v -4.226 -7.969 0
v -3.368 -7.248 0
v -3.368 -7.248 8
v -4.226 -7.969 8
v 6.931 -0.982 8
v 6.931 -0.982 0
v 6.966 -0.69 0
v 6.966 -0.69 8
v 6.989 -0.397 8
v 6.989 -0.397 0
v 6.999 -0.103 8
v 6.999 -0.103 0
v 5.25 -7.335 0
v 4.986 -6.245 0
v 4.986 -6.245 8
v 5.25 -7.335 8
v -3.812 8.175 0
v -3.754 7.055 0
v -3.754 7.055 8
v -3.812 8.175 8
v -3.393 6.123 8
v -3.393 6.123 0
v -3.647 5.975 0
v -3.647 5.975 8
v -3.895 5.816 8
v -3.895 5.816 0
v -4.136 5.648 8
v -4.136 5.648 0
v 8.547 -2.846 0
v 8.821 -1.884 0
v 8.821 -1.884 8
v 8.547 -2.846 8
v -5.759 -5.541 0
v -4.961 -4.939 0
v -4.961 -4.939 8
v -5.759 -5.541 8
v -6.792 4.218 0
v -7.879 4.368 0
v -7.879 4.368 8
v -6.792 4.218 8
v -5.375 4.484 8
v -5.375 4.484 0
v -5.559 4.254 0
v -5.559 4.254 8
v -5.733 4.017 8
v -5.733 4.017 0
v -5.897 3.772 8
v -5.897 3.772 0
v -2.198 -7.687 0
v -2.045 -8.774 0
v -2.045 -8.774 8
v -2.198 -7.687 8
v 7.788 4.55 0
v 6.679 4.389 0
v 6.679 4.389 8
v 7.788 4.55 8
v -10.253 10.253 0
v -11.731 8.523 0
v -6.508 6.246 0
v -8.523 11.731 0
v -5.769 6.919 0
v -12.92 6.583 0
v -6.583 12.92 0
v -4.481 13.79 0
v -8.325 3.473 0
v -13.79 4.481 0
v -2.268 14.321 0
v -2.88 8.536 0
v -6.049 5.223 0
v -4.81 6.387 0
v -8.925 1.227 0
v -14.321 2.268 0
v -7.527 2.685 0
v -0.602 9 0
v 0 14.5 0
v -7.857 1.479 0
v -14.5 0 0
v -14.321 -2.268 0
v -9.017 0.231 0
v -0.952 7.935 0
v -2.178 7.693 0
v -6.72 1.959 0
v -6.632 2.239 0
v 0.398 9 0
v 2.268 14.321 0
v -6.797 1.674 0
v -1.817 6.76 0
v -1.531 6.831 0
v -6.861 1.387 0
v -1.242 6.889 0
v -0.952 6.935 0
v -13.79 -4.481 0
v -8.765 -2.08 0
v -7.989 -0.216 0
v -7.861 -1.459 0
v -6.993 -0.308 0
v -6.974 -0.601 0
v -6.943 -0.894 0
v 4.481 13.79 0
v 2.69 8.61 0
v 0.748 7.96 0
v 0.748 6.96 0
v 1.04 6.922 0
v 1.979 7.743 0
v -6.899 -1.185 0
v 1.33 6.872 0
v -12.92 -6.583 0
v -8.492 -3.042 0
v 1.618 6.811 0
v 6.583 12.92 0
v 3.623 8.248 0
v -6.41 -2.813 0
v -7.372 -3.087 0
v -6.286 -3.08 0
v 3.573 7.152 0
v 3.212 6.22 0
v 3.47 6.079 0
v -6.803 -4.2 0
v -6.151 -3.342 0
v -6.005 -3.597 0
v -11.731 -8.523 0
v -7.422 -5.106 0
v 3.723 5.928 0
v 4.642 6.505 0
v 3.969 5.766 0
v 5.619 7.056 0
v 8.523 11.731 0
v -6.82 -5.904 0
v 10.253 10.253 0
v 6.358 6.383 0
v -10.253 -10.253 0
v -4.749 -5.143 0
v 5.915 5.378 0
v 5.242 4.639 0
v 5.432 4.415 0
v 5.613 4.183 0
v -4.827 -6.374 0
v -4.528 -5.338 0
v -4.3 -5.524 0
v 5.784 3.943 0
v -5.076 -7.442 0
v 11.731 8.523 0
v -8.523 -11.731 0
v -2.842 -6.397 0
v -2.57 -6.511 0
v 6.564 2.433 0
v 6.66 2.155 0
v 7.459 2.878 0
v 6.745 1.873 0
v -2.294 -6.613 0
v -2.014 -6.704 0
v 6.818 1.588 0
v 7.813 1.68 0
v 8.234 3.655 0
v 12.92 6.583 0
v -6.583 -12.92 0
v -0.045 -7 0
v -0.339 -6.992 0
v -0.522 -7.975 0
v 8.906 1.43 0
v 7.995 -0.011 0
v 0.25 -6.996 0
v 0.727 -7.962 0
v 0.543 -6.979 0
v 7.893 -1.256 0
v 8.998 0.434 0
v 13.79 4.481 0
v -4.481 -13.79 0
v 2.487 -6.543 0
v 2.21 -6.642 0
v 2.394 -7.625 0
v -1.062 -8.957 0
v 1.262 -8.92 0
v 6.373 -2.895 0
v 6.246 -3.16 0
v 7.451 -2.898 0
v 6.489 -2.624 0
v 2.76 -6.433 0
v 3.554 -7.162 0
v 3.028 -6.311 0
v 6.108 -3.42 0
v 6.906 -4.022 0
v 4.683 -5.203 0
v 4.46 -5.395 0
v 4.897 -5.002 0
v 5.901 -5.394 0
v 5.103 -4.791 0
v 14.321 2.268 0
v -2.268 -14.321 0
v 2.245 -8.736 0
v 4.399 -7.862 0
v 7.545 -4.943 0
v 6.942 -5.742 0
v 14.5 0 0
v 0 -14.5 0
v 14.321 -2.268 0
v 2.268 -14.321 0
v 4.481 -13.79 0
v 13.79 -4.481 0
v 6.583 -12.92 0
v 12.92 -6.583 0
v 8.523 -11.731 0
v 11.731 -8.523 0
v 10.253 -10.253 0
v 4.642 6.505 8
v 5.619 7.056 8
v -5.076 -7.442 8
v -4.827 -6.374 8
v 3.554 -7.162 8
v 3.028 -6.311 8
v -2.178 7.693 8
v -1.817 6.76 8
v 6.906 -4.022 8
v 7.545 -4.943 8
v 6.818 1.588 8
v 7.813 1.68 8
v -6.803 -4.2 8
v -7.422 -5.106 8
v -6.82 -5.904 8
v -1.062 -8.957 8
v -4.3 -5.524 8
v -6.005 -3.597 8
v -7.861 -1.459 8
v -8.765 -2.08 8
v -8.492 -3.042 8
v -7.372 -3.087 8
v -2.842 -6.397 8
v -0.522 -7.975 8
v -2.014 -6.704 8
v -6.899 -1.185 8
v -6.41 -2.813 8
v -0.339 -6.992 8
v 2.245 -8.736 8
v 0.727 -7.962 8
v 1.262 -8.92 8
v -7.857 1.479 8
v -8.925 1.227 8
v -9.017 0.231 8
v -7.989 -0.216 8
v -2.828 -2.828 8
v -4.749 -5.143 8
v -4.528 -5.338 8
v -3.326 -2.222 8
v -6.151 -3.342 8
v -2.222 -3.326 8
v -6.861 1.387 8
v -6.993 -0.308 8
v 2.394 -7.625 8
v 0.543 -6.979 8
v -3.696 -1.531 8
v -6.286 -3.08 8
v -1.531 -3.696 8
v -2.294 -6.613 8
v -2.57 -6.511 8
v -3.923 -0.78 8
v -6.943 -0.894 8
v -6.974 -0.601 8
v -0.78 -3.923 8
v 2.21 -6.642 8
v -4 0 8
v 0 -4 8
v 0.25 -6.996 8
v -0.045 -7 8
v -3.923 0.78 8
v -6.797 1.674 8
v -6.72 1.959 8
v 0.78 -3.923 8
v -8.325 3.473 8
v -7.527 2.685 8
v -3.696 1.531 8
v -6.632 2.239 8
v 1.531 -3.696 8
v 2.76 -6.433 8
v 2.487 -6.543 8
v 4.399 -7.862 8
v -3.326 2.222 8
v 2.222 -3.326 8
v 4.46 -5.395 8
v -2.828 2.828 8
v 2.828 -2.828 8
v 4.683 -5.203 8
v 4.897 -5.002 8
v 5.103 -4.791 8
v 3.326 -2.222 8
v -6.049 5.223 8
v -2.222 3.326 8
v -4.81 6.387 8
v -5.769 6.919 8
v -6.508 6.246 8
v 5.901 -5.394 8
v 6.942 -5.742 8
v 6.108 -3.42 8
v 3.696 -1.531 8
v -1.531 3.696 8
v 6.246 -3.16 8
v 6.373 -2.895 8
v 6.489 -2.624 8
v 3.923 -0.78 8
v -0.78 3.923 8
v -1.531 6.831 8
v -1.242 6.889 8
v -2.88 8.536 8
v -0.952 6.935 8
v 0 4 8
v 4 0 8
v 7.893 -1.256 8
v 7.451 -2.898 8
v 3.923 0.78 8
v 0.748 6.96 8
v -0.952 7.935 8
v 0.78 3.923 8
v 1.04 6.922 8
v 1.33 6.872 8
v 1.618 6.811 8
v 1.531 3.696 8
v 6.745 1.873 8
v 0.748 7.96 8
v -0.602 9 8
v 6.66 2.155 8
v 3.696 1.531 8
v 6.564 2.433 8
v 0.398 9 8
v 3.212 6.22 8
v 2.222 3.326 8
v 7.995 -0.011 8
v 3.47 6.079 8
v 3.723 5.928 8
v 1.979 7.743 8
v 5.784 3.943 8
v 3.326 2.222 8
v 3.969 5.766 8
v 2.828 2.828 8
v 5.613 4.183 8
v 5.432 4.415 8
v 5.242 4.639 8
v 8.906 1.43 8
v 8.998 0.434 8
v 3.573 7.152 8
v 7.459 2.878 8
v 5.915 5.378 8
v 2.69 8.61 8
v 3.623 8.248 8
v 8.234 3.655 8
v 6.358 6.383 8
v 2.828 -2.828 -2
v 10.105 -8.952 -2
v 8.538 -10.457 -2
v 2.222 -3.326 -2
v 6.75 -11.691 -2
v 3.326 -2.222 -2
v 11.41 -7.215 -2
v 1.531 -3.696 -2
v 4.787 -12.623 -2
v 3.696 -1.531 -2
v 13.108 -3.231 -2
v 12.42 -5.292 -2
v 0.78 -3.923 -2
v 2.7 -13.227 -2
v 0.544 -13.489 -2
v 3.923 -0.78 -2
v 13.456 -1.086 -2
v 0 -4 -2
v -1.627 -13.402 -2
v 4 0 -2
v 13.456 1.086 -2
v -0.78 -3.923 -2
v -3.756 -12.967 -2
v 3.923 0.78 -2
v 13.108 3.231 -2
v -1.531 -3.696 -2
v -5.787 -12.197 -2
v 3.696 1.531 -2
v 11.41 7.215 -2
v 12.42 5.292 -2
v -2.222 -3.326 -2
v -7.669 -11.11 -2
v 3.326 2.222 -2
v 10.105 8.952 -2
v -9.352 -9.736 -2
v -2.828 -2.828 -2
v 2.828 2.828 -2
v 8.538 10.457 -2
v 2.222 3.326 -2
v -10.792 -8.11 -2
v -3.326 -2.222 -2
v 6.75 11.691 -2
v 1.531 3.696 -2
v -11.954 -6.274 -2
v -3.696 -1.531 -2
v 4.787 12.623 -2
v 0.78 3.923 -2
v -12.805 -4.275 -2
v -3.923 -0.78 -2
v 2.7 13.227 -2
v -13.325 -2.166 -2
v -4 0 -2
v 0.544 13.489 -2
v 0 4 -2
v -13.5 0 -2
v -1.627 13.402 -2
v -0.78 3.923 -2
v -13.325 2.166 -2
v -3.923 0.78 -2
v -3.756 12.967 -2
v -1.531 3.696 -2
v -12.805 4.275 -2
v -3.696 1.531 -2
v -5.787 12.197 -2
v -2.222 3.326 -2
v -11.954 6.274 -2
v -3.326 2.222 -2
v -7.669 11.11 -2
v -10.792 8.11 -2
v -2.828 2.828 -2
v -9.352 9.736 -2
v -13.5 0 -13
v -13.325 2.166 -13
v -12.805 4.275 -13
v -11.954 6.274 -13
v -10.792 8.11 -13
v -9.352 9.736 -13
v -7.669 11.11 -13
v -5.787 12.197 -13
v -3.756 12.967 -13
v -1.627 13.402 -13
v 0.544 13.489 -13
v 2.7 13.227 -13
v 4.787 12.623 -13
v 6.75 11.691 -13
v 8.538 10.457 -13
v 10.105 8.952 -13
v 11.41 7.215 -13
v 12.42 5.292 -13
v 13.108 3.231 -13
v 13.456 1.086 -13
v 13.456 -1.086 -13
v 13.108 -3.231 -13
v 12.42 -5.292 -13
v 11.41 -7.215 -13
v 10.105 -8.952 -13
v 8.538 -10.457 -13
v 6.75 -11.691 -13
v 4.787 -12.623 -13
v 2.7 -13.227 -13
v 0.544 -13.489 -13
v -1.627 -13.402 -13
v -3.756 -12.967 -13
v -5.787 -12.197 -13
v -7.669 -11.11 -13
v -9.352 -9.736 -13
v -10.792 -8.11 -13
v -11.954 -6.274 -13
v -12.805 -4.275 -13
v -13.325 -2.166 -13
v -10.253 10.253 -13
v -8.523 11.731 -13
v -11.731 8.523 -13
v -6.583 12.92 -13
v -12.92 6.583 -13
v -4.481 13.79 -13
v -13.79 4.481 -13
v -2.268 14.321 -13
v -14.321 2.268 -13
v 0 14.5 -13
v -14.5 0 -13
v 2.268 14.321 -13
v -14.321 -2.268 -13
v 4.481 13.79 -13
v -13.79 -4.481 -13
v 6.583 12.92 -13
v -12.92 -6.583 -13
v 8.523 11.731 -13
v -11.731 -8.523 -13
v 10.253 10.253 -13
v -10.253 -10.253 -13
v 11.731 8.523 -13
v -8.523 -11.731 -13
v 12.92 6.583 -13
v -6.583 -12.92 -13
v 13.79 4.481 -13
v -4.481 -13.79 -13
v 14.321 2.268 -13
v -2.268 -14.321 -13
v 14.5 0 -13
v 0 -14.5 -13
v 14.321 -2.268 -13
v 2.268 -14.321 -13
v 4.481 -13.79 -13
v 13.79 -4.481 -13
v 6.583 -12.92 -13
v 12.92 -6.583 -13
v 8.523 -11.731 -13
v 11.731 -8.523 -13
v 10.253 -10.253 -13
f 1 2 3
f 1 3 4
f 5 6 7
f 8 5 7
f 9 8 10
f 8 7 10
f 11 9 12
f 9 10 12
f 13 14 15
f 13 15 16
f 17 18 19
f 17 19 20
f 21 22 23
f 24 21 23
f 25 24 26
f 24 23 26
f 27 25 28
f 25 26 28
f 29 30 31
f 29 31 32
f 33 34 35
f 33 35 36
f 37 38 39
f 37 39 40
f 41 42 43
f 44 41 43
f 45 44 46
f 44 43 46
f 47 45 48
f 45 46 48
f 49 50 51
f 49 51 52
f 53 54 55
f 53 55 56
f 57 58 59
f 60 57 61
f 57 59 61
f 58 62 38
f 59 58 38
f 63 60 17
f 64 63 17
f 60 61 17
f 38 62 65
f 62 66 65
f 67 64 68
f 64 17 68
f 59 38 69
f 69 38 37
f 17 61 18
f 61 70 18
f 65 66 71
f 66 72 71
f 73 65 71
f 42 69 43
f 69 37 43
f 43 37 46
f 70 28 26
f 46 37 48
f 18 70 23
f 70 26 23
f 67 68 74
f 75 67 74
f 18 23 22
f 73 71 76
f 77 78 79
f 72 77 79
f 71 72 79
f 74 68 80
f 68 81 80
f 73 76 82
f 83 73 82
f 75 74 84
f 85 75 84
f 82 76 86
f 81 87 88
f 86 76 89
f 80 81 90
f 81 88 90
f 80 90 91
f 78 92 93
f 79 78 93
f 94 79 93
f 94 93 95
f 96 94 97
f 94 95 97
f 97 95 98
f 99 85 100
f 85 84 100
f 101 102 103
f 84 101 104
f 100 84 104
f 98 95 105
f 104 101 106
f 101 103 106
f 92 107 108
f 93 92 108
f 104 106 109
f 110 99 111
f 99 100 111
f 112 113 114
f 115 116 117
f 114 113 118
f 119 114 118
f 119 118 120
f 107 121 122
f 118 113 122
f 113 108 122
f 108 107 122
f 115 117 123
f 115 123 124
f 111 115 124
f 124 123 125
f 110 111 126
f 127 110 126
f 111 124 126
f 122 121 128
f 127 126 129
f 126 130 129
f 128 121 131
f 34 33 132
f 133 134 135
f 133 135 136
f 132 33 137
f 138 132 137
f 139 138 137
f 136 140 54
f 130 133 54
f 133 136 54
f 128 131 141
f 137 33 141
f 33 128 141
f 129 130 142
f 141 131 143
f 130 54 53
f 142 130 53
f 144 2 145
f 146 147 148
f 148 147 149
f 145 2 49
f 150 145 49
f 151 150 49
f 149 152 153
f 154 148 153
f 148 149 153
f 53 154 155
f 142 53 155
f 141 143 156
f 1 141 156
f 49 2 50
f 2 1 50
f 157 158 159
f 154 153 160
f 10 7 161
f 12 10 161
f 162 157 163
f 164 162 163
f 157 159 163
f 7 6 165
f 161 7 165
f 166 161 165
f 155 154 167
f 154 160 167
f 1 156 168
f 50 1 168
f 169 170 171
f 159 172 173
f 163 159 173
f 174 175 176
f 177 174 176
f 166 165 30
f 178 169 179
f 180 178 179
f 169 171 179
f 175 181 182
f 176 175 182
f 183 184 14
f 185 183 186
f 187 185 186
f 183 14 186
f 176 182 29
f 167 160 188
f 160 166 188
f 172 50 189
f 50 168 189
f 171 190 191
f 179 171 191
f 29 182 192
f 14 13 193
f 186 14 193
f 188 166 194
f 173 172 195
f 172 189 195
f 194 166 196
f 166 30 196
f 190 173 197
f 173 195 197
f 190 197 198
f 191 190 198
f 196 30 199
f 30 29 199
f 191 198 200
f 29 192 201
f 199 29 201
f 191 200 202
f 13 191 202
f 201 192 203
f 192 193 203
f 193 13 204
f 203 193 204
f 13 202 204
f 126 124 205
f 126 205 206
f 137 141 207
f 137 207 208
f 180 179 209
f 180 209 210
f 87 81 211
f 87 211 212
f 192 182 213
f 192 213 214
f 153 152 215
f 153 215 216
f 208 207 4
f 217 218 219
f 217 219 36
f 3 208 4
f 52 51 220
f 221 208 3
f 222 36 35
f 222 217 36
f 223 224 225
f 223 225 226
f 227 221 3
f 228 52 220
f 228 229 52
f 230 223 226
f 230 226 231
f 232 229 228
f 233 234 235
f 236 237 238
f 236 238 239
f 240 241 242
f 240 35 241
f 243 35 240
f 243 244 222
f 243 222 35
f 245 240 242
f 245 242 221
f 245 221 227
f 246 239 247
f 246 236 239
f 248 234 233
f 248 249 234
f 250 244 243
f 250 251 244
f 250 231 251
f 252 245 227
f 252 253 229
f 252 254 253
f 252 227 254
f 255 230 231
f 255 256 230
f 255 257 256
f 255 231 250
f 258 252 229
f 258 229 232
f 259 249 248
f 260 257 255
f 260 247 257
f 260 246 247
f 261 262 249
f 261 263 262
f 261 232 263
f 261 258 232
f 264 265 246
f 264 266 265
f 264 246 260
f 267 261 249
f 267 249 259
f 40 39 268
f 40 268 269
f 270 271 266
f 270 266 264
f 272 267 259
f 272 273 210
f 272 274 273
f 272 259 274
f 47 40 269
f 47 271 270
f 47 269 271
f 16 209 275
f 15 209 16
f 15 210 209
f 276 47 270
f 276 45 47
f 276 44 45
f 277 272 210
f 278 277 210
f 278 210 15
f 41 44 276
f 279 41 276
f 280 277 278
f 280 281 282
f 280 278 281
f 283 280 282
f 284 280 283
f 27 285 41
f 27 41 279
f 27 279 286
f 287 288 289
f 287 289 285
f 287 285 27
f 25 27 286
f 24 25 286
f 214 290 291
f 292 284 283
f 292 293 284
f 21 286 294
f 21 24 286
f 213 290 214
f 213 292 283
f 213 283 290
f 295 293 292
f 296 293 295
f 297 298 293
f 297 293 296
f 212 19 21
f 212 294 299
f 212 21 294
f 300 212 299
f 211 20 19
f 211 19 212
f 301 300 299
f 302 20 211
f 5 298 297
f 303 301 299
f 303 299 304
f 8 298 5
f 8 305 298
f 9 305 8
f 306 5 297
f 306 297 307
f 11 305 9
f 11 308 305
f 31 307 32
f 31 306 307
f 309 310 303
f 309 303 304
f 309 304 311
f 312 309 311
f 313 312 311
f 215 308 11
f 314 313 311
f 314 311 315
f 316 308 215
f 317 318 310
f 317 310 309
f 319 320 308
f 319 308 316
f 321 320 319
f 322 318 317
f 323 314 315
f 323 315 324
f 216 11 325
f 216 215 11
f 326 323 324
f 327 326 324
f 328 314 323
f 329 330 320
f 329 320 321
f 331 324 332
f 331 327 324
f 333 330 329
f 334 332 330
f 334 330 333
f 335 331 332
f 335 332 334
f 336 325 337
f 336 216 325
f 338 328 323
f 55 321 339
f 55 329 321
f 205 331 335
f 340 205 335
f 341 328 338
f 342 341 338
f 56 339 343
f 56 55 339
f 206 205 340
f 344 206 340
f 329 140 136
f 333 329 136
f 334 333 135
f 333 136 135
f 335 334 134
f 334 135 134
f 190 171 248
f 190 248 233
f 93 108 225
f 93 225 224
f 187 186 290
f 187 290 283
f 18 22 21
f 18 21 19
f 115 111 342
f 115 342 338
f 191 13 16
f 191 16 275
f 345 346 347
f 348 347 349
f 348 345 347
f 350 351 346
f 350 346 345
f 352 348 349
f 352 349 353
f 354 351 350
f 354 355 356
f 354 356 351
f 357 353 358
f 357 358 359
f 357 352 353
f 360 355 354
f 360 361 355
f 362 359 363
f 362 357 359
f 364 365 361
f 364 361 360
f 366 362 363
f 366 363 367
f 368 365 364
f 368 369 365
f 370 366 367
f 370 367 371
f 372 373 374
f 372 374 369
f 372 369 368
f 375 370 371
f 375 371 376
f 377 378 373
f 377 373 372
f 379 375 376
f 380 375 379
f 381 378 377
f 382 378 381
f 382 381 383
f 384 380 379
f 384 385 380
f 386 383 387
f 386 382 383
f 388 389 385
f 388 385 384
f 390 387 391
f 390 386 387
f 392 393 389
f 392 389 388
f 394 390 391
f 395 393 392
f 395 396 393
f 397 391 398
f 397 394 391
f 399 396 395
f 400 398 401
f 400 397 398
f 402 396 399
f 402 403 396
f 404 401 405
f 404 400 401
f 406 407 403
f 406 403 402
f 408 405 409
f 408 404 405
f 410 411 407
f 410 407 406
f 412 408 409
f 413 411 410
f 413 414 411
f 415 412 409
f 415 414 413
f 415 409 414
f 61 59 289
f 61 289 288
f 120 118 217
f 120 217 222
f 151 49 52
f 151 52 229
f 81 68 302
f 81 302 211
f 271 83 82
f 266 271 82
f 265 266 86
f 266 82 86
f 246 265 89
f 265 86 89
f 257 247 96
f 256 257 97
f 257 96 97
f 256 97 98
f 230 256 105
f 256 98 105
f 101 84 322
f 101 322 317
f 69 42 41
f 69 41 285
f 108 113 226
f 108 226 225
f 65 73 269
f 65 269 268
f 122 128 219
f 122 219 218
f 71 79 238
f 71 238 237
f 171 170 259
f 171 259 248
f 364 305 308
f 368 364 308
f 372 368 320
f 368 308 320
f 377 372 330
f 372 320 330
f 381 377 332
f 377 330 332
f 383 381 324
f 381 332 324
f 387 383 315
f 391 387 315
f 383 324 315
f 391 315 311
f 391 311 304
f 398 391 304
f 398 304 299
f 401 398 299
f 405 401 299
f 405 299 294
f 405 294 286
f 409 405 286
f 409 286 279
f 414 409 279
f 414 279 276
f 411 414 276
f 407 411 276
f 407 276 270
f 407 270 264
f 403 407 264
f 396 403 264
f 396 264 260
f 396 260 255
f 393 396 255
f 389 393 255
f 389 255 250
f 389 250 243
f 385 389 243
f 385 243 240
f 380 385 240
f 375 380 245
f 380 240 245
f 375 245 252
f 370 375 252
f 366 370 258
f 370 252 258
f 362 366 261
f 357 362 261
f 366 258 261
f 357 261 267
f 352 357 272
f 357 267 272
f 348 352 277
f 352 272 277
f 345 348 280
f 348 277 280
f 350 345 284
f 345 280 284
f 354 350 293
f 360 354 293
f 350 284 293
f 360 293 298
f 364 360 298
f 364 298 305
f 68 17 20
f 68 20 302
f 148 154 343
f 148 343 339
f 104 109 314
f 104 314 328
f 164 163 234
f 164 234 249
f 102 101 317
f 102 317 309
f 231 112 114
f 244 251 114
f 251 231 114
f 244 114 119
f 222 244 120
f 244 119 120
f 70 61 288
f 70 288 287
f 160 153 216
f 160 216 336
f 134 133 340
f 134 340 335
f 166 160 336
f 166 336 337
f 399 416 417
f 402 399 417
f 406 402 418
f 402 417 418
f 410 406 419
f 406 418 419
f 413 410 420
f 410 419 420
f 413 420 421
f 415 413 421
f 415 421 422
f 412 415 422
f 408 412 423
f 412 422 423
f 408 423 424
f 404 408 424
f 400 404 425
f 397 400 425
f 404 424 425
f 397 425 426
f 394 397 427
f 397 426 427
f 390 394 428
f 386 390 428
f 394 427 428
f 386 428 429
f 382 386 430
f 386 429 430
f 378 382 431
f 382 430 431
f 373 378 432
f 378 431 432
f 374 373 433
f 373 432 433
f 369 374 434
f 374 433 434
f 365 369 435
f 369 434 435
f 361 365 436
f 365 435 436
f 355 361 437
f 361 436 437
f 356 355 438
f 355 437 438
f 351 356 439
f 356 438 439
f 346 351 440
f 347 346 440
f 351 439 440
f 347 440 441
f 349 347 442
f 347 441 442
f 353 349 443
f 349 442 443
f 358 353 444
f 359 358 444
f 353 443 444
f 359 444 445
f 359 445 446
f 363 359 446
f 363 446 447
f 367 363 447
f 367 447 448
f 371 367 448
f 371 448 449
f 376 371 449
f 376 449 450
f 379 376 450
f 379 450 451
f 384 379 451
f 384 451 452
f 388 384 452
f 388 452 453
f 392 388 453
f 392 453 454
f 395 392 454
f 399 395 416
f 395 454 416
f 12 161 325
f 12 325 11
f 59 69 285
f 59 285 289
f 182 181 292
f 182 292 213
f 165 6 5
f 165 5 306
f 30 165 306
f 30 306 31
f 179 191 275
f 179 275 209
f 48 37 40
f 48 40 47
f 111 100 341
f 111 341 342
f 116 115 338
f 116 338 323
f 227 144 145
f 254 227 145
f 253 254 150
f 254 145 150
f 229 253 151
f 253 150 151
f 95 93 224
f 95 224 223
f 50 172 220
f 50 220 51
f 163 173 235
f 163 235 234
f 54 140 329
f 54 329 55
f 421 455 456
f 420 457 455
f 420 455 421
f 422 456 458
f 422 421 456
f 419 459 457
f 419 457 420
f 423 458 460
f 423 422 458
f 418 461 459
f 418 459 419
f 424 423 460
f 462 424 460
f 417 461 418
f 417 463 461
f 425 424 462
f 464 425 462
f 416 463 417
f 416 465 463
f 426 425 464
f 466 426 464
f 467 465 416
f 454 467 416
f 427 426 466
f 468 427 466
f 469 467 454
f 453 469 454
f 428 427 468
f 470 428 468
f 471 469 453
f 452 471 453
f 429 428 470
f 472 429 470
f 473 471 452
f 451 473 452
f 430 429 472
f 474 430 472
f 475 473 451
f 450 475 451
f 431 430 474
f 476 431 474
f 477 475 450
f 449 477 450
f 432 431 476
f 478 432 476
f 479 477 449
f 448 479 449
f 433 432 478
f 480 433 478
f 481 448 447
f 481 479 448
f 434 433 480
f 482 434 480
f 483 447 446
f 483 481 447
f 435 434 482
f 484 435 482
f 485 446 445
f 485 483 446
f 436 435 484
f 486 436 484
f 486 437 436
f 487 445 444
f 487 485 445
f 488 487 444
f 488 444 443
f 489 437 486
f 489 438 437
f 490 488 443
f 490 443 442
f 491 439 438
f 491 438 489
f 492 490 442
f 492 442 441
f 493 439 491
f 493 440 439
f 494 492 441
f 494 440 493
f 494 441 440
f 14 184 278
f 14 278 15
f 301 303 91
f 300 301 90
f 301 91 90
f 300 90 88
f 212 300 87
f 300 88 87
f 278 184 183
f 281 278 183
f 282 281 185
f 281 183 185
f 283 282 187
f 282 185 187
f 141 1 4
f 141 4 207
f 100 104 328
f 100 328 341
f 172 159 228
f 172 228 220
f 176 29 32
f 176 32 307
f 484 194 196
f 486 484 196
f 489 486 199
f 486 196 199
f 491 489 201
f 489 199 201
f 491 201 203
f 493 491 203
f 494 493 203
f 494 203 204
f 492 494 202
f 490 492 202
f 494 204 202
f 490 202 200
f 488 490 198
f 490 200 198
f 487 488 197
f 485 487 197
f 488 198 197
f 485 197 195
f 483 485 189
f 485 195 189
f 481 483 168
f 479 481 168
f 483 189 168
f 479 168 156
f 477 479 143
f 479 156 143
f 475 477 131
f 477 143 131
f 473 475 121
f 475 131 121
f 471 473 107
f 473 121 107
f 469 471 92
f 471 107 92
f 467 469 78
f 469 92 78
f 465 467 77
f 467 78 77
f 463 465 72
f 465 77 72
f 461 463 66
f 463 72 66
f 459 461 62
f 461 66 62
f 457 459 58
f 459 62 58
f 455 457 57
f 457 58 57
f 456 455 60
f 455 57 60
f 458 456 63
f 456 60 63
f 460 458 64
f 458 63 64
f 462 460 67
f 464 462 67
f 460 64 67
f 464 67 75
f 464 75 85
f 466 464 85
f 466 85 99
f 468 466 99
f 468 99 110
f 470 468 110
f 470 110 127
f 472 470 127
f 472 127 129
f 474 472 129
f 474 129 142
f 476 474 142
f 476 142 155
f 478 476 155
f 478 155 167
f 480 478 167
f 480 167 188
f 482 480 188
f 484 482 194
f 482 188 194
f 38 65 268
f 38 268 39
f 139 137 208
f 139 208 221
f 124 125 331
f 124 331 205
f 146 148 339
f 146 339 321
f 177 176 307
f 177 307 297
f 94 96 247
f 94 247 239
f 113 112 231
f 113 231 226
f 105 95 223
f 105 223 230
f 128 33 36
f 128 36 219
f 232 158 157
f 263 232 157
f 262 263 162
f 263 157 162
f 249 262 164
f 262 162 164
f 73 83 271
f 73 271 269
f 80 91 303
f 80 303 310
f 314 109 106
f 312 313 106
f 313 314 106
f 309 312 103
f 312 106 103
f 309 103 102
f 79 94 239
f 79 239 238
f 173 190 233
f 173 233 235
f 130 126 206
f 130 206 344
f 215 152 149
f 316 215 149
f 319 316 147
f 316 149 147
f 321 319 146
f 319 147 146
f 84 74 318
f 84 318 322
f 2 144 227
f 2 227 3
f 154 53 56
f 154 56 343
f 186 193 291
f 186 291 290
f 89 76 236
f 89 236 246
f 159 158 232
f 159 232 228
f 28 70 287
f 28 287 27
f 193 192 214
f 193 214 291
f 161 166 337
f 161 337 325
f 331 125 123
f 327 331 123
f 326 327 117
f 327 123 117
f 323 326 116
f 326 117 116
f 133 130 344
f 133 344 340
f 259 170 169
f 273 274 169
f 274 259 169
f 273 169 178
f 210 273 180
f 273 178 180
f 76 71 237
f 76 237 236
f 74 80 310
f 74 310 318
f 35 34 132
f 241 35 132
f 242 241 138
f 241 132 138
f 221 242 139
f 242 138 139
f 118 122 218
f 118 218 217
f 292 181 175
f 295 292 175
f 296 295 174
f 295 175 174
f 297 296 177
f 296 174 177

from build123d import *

# Parameters (mm, degrees)
SKETCH2_R           = 7
BOSS_EXTRUDE1_DEPTH = 8
BOSS_EXTRUDE2_DEPTH = 8
CIRPATTERN1_COUNT   = 17
SKETCH5_R           = 14.5
BOSS_EXTRUDE3_DEPTH = 13
SKETCH6_R           = 13.5
CUT_EXTRUDE1_DEPTH  = 11
SKETCH7_R           = 4
CUT_EXTRUDE2_DEPTH  = 11


with BuildPart() as part:
    # Sketch2 → Boss-Extrude1 (new body)
    with BuildSketch(Plane.XY):
        Circle(SKETCH2_R)
    extrude(amount=BOSS_EXTRUDE1_DEPTH)

    # Sketch4 → Boss-Extrude2 (add)
    with BuildSketch(Plane.XY):
        with BuildLine():
            Line((-0.95177028, 6.934993391), (-0.95177028, 7.934993391))
            Line((-0.95177028, 7.934993391), (-0.60177028, 9))
            Line((-0.60177028, 9), (0.39822972, 9))
            Line((0.39822972, 9), (0.74822972, 7.959895997))
            Line((0.74822972, 7.959895997), (0.74822972, 6.959895997))
            ThreePointArc((0.74822972, 6.959895997), (-0.102529141, 6.999249087), (-0.95177028, 6.934993391))
        make_face()
    boss_extrude2 = extrude(amount=BOSS_EXTRUDE2_DEPTH)

    # CirPattern1: Boss-Extrude2 ×17 about axis
    cirpattern1_axis = Axis((0, 0, 0), (0, 0, 1))
    for i in range(1, CIRPATTERN1_COUNT):
        add(boss_extrude2.rotate(cirpattern1_axis, i * 360 / CIRPATTERN1_COUNT))

    # Sketch5 → Boss-Extrude3 (add)
    with BuildSketch(Plane(origin=(0, 0, 0), x_dir=(-1, 0, 0), z_dir=(0, 0, -1))):
        with Locations(Location((0, 0, 0), (0, 0, 180))):
            Circle(SKETCH5_R)
    extrude(amount=BOSS_EXTRUDE3_DEPTH)

    # Sketch6 → Cut-Extrude1 (cut)
    with BuildSketch(Plane(origin=(0, 0, -13), x_dir=(-1, 0, 0), z_dir=(0, 0, -1))):
        Circle(SKETCH6_R)
    extrude(amount=-CUT_EXTRUDE1_DEPTH, mode=Mode.SUBTRACT)

    # Sketch7 → Cut-Extrude2 (cut)
    with BuildSketch(Plane.XY.offset(8)):
        Circle(SKETCH7_R)
    extrude(amount=-CUT_EXTRUDE2_DEPTH, mode=Mode.SUBTRACT)


solid = part.part
